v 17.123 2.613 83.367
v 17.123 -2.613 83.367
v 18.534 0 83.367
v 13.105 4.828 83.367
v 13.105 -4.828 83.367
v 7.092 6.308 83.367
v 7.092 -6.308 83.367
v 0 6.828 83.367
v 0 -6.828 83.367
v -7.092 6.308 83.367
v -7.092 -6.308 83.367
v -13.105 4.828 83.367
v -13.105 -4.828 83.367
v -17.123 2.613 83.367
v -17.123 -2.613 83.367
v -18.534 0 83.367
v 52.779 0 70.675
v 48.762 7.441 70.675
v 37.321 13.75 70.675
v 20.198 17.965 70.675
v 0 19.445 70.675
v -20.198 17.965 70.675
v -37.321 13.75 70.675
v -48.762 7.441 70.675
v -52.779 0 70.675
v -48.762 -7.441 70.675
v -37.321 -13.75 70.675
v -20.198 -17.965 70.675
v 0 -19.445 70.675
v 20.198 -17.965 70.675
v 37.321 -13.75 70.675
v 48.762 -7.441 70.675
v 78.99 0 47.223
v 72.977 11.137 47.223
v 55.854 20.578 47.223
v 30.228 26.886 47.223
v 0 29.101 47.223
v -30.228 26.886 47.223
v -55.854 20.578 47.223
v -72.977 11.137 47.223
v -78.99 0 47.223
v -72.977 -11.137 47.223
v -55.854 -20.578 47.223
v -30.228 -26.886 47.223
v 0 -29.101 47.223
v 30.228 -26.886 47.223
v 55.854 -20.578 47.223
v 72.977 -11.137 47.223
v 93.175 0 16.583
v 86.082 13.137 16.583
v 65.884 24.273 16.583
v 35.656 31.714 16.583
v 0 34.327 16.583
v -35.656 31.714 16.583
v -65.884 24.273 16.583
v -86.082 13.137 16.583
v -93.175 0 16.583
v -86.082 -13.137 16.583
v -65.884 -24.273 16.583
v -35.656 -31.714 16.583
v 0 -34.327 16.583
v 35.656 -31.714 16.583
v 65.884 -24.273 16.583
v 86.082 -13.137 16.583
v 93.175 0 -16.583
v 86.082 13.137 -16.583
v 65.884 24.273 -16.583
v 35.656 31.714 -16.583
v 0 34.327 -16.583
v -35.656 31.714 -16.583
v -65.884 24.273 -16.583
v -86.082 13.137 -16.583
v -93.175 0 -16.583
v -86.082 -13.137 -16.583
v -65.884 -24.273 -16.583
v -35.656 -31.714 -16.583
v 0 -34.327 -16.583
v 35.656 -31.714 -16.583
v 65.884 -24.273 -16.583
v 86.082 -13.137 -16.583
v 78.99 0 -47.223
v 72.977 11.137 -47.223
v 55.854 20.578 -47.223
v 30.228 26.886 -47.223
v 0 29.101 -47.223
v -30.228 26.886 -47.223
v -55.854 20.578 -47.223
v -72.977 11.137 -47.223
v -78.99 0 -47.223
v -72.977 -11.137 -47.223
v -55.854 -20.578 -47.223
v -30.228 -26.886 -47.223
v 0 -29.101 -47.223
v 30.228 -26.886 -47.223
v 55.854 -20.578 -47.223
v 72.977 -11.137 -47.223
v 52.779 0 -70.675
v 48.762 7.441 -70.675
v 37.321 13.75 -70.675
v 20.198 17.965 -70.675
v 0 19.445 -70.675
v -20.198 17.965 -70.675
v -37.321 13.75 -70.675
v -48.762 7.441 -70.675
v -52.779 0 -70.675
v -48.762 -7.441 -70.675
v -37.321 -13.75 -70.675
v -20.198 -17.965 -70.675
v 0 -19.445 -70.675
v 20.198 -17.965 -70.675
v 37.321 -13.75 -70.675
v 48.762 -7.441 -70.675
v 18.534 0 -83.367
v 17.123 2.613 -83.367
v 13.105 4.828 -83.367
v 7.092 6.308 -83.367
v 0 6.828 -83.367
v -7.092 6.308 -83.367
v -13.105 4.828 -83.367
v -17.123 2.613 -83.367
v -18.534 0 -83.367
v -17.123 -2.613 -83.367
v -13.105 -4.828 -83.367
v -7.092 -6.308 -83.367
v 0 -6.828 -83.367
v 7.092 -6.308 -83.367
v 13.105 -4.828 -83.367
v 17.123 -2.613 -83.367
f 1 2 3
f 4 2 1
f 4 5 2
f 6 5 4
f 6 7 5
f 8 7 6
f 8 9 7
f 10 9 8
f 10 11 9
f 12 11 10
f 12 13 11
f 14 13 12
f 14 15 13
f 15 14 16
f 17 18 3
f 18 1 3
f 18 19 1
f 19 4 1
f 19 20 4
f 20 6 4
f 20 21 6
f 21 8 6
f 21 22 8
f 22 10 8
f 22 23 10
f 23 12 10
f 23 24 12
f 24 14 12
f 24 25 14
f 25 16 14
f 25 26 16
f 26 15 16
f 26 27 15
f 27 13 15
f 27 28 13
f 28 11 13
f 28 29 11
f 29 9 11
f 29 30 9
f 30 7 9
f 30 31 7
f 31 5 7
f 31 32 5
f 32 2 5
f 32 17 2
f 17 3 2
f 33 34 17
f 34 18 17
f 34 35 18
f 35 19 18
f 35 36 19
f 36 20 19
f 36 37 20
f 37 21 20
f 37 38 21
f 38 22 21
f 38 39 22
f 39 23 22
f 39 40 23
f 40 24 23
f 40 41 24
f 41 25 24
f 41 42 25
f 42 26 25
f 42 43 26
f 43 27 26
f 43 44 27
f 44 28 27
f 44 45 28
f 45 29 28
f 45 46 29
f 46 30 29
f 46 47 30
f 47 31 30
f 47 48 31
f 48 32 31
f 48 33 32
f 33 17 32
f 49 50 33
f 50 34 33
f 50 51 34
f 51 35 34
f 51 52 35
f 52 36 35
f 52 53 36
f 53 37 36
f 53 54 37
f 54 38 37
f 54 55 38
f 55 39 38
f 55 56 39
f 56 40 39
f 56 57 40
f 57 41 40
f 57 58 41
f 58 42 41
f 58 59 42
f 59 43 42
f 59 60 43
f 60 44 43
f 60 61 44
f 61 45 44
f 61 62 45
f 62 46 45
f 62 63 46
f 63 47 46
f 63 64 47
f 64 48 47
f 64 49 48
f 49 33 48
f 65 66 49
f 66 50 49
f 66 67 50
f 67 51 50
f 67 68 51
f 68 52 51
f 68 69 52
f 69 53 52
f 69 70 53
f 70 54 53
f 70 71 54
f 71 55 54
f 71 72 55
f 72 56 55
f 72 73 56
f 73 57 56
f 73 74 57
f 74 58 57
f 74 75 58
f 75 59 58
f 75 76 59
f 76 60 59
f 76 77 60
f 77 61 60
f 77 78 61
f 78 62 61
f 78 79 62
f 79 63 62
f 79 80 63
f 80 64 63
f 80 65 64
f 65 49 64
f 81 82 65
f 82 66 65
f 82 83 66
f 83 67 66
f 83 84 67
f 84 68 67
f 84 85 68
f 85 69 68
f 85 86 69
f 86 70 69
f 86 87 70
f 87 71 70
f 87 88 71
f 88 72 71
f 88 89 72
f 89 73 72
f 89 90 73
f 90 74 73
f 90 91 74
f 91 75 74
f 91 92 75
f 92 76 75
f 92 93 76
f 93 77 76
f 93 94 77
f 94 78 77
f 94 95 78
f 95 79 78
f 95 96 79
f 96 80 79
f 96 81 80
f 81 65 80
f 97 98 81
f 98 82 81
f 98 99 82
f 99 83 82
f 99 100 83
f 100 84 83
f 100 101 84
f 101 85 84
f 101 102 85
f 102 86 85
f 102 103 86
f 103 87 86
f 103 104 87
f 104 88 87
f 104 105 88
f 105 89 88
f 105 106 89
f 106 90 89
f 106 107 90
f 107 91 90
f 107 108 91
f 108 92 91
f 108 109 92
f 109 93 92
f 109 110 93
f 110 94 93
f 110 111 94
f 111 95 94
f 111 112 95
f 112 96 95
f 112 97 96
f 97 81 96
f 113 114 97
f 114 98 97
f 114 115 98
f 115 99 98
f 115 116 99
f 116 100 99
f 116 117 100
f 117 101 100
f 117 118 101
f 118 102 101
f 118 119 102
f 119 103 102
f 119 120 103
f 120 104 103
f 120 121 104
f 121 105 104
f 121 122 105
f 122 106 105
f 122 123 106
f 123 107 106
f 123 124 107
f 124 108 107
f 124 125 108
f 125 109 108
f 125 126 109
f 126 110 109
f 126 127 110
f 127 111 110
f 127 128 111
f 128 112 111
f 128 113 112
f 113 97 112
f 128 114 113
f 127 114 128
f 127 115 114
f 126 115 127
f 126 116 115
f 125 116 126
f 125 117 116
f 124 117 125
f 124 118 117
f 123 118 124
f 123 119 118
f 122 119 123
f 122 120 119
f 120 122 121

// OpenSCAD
// Generated by SolidPython 1.0.1 on 2020-07-29 00:46:53


scale(v = [19, 7, 17]) {
	sphere(r = 5);
}
/***********************************************
*********      SolidPython code:      **********
************************************************
 
# import packages: SolidPython
from solid import *
from solid.utils import *
from itertools import chain, combinations, permutations


class Resize:

    def __init__(self, scad_file):
        self.scad_file = scad_file
        #self.scad_file = import_scad(scad_file)
        # cone/cylinder param:
        self.r1 = 0
        self.r2 = 0
        self.h = 0
        # rectangular prism param:
        self.w = 0
        self.l = 0
        # ellipse param:
        self.r = 0

    # import OpenScad code (file name corresponds to shape)


    # classify shape + parameters
    def assign(self, param1, param2, param3):
        if self.scad_file == 'cone.scad':
            self.r1 = param1
            self.r2 = param2
            self.h = param3
        elif self.scad_file == 'cylinder.scad':
            self.r1 = param1
            self.r2 = param2
            self.h = param3
        elif self.scad_file == 'rectangularPrism.scad':
            self.h = param1
            self.l = param2
            self.w = param3
        else:
            self.r = param1
            self.h = param2

    # resize parameters
    def iterate(self):
        x = range(3, 20, 2)
        i = 1
        if self.scad_file == 'cone.scad':
            tempList = list(permutations(x, 2))
            for temp in tempList:
                param1 = temp[0]
                param2 = temp[1]
                filepath = 'produced_scad_files/' + 'cone' + str(param1) + '_' + str(param2) + '_' + '.scad'
                scad_render_to_file(cylinder(h=param1, r1=param2, r2=0), filepath)

        elif self.scad_file == 'cylinder.scad':
            tempList = list(permutations(x, 3))
            for temp in tempList:
                param1 = temp[0]
                param2 = temp[1]
                filepath = 'produced_scad_files/' + 'cylinder' + str(param1) + '_' + str(param2) + '_' + '.scad'
                scad_render_to_file(cylinder(h=param1, r1=param2, r2=param2), filepath)

        elif self.scad_file == 'rectangularPrism.scad':
            tempList = list(permutations(x, 3))
            for temp in tempList:
                param1 = temp[0]
                param2 = temp[1]
                param3 = temp[2]
                filepath = 'produced_scad_files/' + 'rectangularPrism' + str(param1) + '_' + str(param2) + '_' + str(
                    param3) + '.scad'
                scad_render_to_file(cube(size=(param1, param2, param3)), filepath)

        elif self.scad_file == 'ellipse.scad':
            tempList = list(permutations(x, 4))
            for temp in tempList:
                param1 = temp[0]
                param2 = temp[1]
                param3 = temp[2]
                param4 = temp[3]
                filepath = 'produced_scad_files/' + 'ellipse' + str(param1) + '_' + str(param2) + '_' + str(param3) + '_' + str(param4) + '.scad'
                scad_render_to_file(scale([param1, param2, param3])(sphere(r=param4)), filepath)

    def render_to_scadfile(self):
        scad_render_to_file(scad, 'example.scad') 
 
************************************************/
